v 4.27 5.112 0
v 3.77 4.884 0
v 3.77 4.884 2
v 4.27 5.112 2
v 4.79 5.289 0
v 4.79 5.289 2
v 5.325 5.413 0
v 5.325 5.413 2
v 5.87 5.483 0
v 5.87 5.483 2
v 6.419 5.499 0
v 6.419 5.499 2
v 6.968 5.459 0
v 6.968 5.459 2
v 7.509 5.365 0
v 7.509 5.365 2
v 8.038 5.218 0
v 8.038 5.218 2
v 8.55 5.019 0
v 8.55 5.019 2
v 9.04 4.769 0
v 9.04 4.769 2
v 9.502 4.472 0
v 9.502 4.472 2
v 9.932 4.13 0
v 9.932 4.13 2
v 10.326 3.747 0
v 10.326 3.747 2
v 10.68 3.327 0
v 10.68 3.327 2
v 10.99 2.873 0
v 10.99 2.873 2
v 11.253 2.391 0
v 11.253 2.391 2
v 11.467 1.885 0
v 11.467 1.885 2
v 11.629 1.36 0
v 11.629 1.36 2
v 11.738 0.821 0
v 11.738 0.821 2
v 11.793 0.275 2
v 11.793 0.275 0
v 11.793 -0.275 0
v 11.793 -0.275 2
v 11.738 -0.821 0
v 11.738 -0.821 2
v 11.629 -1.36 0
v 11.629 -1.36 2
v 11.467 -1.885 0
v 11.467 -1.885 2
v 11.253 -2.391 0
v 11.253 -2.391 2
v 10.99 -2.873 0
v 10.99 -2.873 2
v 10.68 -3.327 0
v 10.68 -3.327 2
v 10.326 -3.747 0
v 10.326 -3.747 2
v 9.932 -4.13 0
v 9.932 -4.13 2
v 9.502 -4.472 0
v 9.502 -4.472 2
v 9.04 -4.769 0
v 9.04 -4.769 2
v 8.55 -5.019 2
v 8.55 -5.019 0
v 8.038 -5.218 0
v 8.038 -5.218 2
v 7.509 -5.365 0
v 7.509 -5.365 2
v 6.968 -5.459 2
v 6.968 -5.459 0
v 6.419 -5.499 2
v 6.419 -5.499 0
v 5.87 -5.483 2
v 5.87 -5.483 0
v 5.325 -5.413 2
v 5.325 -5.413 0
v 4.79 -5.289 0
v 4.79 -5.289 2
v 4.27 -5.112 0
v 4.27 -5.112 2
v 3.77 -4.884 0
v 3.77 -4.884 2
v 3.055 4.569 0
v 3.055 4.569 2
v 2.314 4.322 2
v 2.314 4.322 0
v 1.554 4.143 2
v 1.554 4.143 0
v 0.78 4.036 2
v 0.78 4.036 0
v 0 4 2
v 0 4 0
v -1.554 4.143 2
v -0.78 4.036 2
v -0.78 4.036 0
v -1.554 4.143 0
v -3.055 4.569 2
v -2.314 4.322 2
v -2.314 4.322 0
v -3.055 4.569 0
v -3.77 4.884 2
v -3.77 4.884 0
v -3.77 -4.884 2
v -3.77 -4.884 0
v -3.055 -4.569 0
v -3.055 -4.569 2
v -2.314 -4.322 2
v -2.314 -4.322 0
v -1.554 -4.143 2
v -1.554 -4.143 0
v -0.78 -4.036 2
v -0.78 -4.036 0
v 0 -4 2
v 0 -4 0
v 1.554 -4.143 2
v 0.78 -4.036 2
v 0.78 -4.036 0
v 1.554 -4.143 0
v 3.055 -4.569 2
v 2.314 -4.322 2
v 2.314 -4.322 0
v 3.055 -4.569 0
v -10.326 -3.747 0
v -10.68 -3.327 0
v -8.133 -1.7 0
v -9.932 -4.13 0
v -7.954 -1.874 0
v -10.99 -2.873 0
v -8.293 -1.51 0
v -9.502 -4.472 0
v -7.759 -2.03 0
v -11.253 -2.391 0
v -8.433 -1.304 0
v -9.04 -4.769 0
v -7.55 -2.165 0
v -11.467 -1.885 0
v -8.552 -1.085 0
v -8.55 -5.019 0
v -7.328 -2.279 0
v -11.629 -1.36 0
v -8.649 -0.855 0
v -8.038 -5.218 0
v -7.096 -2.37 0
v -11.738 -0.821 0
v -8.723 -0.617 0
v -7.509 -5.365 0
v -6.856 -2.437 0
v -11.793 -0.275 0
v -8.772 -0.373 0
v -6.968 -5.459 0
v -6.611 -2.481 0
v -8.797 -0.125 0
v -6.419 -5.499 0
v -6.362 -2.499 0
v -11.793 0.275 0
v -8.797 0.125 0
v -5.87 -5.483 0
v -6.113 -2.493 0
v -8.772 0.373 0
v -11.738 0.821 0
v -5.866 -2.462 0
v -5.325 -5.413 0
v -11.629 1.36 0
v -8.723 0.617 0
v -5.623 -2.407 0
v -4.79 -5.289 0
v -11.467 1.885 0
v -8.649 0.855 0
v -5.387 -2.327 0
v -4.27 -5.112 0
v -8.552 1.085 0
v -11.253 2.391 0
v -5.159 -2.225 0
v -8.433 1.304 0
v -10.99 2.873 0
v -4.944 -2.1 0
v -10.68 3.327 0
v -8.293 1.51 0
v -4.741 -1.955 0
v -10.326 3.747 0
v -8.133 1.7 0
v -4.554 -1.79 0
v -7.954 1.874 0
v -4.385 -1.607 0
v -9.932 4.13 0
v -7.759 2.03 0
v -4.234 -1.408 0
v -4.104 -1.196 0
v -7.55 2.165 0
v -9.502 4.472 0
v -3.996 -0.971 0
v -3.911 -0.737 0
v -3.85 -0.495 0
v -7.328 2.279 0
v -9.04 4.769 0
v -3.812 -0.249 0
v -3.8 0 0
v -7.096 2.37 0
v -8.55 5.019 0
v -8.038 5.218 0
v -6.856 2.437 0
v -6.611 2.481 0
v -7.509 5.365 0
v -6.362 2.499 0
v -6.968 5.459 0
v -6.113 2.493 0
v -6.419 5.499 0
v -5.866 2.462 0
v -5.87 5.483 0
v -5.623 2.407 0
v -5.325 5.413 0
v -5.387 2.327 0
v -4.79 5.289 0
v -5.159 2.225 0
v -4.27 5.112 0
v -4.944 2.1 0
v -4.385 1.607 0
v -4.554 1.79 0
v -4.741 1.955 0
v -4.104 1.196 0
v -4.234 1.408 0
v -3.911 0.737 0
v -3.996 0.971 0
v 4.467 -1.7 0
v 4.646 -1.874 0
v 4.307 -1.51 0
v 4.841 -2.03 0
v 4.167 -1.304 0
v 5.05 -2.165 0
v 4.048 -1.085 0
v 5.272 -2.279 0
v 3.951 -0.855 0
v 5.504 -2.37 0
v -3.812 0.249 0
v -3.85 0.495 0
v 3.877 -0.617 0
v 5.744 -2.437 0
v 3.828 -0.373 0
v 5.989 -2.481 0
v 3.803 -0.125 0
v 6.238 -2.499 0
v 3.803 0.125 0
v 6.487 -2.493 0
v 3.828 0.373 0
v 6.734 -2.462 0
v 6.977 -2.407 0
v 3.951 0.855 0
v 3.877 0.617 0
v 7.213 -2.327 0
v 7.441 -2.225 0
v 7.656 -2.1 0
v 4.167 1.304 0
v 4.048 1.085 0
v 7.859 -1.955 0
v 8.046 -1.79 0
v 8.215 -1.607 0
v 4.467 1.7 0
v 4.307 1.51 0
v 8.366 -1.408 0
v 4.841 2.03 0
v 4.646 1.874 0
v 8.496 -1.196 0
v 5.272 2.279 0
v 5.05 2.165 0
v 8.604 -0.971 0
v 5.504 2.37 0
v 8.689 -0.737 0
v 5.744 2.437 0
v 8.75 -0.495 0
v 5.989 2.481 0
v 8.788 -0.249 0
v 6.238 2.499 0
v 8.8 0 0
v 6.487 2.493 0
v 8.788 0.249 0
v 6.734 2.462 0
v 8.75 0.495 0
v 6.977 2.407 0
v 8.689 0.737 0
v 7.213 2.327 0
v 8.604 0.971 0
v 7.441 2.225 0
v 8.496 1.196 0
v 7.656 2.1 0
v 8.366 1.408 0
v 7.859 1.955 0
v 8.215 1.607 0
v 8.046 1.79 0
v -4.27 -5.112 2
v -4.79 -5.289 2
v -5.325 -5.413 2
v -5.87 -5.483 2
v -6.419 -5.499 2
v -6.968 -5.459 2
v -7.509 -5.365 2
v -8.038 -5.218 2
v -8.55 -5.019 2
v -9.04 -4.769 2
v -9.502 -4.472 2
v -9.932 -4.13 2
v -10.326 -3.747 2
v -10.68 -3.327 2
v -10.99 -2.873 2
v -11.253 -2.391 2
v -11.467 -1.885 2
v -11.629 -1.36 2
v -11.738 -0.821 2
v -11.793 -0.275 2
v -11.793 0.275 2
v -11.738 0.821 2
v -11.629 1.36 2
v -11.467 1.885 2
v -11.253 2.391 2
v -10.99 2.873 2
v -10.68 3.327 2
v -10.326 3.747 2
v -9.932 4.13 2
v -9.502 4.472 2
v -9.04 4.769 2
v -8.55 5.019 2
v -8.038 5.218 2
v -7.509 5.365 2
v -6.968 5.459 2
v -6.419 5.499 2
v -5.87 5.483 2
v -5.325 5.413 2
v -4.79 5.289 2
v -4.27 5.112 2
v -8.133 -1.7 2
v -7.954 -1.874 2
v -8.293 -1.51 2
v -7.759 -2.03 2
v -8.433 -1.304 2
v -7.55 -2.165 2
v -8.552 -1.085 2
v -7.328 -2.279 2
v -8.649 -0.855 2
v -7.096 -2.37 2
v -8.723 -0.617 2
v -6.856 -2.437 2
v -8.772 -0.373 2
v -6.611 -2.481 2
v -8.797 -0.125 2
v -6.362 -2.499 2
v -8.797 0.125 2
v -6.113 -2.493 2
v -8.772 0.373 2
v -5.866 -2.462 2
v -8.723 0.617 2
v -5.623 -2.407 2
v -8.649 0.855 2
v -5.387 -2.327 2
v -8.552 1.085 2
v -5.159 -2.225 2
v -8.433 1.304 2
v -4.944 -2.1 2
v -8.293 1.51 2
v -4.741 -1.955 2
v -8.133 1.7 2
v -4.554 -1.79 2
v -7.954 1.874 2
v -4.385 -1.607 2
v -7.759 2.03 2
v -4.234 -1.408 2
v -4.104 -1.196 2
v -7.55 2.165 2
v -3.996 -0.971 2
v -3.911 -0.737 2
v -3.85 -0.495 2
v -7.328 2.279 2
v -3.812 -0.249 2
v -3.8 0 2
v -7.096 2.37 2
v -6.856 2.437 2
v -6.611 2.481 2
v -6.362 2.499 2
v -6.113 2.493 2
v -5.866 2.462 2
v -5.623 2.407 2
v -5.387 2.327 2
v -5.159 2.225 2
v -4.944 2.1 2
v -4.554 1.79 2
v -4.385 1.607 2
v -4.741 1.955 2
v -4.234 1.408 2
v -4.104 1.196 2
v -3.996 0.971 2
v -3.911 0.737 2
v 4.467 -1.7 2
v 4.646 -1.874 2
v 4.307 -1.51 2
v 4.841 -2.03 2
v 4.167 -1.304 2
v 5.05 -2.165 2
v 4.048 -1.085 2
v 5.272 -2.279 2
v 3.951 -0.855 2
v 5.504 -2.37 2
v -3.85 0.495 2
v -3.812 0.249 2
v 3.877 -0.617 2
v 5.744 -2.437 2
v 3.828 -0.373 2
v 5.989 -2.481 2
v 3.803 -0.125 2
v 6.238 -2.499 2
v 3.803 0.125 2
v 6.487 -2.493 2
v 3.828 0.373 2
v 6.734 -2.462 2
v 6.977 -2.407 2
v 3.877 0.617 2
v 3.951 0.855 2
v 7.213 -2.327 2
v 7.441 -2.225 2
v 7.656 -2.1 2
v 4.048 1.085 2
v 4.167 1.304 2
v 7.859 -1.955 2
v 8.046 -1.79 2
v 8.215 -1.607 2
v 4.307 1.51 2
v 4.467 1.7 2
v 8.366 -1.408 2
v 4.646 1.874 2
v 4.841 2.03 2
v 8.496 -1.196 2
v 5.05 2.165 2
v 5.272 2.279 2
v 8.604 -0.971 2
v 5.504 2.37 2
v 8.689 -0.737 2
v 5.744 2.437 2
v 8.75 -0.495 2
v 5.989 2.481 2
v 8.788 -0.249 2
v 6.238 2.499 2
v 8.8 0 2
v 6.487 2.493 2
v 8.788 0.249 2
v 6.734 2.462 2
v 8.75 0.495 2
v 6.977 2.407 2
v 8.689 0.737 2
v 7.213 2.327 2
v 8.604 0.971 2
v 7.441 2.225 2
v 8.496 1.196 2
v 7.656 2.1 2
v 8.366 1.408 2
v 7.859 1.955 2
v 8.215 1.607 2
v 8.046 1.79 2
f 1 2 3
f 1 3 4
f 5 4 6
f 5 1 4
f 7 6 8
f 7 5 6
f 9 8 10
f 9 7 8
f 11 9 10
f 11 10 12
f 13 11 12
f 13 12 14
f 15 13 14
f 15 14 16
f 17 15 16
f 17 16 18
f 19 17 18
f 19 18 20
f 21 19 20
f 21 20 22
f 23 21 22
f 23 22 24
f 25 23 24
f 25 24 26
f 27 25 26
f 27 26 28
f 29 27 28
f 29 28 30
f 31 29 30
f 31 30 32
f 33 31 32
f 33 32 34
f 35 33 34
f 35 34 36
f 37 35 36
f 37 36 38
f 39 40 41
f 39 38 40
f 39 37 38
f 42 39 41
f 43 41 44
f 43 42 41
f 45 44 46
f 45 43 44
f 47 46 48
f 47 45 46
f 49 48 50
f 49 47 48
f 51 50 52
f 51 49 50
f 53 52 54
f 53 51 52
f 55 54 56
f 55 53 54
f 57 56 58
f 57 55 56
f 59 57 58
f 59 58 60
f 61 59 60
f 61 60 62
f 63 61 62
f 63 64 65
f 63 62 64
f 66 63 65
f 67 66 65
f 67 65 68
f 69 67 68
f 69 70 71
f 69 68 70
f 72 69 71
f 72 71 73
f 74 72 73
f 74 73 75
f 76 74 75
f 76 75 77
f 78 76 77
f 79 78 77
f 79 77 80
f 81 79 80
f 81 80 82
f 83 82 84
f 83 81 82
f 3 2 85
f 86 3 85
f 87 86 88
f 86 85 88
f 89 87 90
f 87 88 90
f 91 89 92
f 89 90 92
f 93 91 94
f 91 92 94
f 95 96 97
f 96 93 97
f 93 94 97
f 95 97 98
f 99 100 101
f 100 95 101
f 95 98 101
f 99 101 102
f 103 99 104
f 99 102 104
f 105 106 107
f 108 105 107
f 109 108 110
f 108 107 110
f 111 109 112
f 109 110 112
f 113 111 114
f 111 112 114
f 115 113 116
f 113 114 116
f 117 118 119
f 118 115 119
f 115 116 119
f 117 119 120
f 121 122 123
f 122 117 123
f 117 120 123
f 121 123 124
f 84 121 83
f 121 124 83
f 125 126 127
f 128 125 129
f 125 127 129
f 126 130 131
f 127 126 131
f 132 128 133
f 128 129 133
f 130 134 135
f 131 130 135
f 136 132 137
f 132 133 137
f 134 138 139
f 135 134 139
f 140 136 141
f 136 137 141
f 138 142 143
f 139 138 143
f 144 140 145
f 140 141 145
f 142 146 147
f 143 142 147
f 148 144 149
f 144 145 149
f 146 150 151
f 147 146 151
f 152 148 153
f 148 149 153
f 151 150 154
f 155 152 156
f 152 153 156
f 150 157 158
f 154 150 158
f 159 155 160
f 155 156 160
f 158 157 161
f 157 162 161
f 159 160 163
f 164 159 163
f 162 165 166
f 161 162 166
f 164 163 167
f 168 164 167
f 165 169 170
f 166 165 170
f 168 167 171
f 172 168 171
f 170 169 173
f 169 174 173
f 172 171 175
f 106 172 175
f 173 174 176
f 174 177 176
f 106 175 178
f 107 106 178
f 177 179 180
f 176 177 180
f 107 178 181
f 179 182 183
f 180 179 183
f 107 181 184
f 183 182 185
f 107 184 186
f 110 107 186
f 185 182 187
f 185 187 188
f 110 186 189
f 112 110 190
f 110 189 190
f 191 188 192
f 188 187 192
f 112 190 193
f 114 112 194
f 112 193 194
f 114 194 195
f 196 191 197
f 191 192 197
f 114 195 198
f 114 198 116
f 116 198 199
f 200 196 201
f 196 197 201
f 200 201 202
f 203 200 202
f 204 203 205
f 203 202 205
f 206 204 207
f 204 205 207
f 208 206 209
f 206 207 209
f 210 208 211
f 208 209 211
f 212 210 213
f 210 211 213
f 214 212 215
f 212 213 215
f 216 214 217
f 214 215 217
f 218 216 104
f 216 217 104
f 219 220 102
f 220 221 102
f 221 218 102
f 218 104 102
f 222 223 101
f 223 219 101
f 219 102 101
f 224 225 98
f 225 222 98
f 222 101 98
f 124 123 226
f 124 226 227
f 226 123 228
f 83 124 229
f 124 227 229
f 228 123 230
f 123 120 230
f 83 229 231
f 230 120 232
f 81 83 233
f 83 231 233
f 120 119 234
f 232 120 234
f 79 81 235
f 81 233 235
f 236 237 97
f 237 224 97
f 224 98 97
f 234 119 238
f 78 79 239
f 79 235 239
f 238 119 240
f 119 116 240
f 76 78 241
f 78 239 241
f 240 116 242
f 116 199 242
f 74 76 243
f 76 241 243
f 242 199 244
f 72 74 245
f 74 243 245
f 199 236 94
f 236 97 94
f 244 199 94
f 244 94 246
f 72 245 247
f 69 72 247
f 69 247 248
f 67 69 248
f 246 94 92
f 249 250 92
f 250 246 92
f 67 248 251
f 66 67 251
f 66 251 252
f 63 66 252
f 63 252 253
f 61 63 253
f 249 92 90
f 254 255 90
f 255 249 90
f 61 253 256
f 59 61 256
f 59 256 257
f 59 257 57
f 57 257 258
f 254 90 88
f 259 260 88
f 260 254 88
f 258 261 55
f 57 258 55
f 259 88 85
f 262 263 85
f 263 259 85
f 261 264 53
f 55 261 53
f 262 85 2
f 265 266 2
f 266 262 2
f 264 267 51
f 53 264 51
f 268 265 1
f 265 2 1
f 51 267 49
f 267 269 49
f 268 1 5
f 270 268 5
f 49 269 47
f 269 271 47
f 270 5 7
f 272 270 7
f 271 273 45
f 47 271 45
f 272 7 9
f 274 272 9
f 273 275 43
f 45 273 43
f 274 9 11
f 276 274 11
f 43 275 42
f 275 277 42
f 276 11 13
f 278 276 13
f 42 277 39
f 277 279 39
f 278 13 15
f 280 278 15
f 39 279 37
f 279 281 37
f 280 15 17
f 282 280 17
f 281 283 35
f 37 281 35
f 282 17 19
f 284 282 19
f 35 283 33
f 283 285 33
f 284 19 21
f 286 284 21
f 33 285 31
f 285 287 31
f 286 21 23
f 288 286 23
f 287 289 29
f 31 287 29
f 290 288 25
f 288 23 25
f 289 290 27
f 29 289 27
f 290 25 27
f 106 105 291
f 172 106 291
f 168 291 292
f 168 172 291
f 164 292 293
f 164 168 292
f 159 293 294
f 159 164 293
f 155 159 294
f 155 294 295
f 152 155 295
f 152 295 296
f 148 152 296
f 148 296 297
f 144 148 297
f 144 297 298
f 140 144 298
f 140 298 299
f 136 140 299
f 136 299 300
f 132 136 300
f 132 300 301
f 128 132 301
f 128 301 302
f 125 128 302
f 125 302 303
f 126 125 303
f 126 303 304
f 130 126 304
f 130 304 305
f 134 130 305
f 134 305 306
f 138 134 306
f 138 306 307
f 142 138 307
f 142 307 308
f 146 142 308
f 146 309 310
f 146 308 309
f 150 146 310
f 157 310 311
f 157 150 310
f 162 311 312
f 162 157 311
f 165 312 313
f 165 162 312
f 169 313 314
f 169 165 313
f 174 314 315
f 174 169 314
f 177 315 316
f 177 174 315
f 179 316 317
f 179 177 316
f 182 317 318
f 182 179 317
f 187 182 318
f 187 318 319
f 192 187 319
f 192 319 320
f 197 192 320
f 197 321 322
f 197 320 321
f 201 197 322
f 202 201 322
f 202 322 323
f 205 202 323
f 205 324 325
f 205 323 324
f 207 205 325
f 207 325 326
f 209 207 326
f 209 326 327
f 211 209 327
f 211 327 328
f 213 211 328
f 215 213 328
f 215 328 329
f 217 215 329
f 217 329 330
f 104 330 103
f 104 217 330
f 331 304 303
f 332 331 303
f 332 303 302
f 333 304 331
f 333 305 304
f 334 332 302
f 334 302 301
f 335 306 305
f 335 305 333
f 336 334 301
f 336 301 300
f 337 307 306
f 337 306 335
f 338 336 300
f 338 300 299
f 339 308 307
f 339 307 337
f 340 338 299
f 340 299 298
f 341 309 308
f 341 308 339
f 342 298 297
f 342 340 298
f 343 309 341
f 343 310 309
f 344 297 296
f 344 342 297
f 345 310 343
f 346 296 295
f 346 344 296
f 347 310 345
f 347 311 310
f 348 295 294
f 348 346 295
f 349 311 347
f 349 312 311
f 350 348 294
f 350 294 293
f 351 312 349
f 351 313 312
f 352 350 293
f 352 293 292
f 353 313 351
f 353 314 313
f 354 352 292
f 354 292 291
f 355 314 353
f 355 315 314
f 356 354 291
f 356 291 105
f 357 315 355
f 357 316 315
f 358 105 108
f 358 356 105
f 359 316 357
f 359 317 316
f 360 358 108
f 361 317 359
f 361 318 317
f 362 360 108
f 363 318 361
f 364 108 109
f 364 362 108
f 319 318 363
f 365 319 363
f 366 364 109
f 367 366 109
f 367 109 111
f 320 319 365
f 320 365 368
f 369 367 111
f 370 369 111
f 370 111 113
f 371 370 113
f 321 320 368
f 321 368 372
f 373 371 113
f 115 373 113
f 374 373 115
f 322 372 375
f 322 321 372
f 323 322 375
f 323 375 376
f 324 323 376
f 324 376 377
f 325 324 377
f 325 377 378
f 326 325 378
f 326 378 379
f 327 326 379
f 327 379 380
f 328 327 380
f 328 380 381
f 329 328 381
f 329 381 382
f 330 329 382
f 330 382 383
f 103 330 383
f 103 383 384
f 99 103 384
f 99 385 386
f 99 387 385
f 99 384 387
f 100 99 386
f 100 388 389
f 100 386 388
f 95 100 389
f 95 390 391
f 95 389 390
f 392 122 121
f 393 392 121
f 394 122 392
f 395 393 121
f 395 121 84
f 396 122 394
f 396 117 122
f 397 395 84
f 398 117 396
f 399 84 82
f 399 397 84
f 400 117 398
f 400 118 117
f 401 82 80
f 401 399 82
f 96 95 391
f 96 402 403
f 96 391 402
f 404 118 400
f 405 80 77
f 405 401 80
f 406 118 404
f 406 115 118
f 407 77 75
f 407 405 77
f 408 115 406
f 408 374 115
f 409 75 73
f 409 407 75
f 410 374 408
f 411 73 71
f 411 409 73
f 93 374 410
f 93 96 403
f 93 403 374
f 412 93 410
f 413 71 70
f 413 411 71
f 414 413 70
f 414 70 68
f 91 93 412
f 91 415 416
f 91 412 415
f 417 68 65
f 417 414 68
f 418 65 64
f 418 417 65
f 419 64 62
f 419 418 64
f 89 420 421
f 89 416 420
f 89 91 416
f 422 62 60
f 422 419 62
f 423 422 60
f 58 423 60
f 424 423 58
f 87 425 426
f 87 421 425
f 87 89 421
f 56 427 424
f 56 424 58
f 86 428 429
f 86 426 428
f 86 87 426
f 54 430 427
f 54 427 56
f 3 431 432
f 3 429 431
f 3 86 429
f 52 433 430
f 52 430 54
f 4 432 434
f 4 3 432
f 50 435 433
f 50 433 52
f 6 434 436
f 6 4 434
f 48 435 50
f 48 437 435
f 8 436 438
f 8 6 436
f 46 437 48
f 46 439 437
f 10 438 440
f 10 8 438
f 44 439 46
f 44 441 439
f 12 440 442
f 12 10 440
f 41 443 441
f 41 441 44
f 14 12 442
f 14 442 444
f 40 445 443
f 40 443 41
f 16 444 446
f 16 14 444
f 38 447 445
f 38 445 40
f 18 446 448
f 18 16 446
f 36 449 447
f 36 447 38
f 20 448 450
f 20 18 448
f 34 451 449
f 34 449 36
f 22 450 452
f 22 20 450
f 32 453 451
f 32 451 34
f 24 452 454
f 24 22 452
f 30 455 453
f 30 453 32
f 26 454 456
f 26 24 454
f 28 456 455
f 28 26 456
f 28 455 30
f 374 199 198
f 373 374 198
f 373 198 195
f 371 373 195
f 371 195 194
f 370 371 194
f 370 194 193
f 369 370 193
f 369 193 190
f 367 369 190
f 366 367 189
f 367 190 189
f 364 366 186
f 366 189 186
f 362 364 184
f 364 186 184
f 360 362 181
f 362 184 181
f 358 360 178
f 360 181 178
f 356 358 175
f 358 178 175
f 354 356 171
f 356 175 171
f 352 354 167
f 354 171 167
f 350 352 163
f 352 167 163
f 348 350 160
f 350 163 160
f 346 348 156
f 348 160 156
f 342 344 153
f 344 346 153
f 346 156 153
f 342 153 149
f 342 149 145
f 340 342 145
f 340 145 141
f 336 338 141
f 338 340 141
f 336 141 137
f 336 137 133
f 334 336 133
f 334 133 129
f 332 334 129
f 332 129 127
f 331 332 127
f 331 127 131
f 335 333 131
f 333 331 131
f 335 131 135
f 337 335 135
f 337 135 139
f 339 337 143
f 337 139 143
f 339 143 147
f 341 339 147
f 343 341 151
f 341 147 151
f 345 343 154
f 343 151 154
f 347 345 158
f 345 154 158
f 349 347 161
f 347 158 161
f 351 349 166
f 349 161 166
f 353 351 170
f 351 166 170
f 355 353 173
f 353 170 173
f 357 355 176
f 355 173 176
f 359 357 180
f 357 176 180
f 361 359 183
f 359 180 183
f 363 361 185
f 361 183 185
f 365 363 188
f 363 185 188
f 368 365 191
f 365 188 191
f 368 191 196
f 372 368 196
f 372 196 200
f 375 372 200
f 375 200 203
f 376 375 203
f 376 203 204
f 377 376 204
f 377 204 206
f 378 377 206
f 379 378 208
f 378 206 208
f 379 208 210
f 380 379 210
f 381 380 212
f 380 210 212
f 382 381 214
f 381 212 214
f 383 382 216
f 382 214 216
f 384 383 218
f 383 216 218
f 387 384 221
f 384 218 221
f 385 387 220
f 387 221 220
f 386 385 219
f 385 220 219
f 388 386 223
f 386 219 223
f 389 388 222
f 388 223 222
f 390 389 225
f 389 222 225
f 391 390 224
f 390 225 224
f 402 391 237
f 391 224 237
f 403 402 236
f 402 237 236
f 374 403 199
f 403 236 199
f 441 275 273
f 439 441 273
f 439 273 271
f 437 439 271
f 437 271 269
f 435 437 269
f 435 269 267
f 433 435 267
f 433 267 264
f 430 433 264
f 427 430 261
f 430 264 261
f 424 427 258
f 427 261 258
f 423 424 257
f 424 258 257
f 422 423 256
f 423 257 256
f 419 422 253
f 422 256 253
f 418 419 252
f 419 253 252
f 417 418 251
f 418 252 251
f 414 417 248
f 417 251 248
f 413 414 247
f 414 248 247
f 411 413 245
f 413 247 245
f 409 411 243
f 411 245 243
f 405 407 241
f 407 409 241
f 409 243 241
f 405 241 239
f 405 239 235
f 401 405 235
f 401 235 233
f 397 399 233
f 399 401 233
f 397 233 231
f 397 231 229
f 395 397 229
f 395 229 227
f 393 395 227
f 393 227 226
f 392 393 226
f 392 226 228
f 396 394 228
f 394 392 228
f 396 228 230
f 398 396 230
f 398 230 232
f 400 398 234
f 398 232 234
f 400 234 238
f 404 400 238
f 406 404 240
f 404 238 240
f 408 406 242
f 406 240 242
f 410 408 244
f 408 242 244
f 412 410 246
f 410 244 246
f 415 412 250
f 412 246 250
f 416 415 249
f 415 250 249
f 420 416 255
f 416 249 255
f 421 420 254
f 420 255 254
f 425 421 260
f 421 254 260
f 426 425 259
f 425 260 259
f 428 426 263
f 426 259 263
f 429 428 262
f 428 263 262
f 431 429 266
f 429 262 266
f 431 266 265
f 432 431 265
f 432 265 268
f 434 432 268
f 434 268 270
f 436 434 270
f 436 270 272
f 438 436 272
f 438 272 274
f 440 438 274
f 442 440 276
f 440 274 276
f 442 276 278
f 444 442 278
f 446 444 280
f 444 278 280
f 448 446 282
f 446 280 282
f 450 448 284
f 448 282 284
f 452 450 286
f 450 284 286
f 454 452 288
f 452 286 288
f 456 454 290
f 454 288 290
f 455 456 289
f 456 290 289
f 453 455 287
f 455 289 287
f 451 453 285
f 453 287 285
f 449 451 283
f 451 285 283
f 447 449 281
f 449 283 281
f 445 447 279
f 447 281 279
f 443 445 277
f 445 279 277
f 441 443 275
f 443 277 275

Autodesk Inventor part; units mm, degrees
ref_plane "YZ Plane" through (0, 0, 0) normal (1, 0, 0) x (0, 1, 0)
ref_plane "XZ Plane" through (0, 0, 0) normal (0, 1, 0) x (-1, 0, 0)
ref_plane "XY Plane" through (0, 0, 0) normal (0, 0, 1) x (1, 0, 0)
sketch "Sketch1" plane through (0, 0, 0) normal (0, 0, 1) x (1, 0, 0)
  line L0 (-6.3, 0) -> (6.3, 0) construction
  circle A0 centre (-6.3, 0) radius 2.5
  circle A1 centre (6.3, 0) radius 2.5
  arc A2 (-3.7701, 4.8836) -> (-3.7701, -4.8836) centre (-6.3, 0) ccw
  arc A3 (3.7701, -4.8836) -> (3.7701, 4.8836) centre (6.3, 0) ccw
  line L1 (0, 0) -> (0, 4) construction
  line L2 (0, 0) -> (0, -4) construction
  arc A4 (-3.7701, 4.8836) -> (3.7701, 4.8836) centre (0, 12.4848) ccw
  arc A5 (3.7701, -4.8836) -> (-3.7701, -4.8836) centre (0, -12.4848) ccw
  dimension "d0" = 12.6
  dimension "d1" = 5
  dimension "d2" = 5
  dimension "d3" = 11
  dimension "d4" = 11
  dimension "d5" = 4
  dimension "d6" = 4
extrude "Extrusion1" add sketch "Sketch1" along normal blind 2
properties part number "Concha2"
